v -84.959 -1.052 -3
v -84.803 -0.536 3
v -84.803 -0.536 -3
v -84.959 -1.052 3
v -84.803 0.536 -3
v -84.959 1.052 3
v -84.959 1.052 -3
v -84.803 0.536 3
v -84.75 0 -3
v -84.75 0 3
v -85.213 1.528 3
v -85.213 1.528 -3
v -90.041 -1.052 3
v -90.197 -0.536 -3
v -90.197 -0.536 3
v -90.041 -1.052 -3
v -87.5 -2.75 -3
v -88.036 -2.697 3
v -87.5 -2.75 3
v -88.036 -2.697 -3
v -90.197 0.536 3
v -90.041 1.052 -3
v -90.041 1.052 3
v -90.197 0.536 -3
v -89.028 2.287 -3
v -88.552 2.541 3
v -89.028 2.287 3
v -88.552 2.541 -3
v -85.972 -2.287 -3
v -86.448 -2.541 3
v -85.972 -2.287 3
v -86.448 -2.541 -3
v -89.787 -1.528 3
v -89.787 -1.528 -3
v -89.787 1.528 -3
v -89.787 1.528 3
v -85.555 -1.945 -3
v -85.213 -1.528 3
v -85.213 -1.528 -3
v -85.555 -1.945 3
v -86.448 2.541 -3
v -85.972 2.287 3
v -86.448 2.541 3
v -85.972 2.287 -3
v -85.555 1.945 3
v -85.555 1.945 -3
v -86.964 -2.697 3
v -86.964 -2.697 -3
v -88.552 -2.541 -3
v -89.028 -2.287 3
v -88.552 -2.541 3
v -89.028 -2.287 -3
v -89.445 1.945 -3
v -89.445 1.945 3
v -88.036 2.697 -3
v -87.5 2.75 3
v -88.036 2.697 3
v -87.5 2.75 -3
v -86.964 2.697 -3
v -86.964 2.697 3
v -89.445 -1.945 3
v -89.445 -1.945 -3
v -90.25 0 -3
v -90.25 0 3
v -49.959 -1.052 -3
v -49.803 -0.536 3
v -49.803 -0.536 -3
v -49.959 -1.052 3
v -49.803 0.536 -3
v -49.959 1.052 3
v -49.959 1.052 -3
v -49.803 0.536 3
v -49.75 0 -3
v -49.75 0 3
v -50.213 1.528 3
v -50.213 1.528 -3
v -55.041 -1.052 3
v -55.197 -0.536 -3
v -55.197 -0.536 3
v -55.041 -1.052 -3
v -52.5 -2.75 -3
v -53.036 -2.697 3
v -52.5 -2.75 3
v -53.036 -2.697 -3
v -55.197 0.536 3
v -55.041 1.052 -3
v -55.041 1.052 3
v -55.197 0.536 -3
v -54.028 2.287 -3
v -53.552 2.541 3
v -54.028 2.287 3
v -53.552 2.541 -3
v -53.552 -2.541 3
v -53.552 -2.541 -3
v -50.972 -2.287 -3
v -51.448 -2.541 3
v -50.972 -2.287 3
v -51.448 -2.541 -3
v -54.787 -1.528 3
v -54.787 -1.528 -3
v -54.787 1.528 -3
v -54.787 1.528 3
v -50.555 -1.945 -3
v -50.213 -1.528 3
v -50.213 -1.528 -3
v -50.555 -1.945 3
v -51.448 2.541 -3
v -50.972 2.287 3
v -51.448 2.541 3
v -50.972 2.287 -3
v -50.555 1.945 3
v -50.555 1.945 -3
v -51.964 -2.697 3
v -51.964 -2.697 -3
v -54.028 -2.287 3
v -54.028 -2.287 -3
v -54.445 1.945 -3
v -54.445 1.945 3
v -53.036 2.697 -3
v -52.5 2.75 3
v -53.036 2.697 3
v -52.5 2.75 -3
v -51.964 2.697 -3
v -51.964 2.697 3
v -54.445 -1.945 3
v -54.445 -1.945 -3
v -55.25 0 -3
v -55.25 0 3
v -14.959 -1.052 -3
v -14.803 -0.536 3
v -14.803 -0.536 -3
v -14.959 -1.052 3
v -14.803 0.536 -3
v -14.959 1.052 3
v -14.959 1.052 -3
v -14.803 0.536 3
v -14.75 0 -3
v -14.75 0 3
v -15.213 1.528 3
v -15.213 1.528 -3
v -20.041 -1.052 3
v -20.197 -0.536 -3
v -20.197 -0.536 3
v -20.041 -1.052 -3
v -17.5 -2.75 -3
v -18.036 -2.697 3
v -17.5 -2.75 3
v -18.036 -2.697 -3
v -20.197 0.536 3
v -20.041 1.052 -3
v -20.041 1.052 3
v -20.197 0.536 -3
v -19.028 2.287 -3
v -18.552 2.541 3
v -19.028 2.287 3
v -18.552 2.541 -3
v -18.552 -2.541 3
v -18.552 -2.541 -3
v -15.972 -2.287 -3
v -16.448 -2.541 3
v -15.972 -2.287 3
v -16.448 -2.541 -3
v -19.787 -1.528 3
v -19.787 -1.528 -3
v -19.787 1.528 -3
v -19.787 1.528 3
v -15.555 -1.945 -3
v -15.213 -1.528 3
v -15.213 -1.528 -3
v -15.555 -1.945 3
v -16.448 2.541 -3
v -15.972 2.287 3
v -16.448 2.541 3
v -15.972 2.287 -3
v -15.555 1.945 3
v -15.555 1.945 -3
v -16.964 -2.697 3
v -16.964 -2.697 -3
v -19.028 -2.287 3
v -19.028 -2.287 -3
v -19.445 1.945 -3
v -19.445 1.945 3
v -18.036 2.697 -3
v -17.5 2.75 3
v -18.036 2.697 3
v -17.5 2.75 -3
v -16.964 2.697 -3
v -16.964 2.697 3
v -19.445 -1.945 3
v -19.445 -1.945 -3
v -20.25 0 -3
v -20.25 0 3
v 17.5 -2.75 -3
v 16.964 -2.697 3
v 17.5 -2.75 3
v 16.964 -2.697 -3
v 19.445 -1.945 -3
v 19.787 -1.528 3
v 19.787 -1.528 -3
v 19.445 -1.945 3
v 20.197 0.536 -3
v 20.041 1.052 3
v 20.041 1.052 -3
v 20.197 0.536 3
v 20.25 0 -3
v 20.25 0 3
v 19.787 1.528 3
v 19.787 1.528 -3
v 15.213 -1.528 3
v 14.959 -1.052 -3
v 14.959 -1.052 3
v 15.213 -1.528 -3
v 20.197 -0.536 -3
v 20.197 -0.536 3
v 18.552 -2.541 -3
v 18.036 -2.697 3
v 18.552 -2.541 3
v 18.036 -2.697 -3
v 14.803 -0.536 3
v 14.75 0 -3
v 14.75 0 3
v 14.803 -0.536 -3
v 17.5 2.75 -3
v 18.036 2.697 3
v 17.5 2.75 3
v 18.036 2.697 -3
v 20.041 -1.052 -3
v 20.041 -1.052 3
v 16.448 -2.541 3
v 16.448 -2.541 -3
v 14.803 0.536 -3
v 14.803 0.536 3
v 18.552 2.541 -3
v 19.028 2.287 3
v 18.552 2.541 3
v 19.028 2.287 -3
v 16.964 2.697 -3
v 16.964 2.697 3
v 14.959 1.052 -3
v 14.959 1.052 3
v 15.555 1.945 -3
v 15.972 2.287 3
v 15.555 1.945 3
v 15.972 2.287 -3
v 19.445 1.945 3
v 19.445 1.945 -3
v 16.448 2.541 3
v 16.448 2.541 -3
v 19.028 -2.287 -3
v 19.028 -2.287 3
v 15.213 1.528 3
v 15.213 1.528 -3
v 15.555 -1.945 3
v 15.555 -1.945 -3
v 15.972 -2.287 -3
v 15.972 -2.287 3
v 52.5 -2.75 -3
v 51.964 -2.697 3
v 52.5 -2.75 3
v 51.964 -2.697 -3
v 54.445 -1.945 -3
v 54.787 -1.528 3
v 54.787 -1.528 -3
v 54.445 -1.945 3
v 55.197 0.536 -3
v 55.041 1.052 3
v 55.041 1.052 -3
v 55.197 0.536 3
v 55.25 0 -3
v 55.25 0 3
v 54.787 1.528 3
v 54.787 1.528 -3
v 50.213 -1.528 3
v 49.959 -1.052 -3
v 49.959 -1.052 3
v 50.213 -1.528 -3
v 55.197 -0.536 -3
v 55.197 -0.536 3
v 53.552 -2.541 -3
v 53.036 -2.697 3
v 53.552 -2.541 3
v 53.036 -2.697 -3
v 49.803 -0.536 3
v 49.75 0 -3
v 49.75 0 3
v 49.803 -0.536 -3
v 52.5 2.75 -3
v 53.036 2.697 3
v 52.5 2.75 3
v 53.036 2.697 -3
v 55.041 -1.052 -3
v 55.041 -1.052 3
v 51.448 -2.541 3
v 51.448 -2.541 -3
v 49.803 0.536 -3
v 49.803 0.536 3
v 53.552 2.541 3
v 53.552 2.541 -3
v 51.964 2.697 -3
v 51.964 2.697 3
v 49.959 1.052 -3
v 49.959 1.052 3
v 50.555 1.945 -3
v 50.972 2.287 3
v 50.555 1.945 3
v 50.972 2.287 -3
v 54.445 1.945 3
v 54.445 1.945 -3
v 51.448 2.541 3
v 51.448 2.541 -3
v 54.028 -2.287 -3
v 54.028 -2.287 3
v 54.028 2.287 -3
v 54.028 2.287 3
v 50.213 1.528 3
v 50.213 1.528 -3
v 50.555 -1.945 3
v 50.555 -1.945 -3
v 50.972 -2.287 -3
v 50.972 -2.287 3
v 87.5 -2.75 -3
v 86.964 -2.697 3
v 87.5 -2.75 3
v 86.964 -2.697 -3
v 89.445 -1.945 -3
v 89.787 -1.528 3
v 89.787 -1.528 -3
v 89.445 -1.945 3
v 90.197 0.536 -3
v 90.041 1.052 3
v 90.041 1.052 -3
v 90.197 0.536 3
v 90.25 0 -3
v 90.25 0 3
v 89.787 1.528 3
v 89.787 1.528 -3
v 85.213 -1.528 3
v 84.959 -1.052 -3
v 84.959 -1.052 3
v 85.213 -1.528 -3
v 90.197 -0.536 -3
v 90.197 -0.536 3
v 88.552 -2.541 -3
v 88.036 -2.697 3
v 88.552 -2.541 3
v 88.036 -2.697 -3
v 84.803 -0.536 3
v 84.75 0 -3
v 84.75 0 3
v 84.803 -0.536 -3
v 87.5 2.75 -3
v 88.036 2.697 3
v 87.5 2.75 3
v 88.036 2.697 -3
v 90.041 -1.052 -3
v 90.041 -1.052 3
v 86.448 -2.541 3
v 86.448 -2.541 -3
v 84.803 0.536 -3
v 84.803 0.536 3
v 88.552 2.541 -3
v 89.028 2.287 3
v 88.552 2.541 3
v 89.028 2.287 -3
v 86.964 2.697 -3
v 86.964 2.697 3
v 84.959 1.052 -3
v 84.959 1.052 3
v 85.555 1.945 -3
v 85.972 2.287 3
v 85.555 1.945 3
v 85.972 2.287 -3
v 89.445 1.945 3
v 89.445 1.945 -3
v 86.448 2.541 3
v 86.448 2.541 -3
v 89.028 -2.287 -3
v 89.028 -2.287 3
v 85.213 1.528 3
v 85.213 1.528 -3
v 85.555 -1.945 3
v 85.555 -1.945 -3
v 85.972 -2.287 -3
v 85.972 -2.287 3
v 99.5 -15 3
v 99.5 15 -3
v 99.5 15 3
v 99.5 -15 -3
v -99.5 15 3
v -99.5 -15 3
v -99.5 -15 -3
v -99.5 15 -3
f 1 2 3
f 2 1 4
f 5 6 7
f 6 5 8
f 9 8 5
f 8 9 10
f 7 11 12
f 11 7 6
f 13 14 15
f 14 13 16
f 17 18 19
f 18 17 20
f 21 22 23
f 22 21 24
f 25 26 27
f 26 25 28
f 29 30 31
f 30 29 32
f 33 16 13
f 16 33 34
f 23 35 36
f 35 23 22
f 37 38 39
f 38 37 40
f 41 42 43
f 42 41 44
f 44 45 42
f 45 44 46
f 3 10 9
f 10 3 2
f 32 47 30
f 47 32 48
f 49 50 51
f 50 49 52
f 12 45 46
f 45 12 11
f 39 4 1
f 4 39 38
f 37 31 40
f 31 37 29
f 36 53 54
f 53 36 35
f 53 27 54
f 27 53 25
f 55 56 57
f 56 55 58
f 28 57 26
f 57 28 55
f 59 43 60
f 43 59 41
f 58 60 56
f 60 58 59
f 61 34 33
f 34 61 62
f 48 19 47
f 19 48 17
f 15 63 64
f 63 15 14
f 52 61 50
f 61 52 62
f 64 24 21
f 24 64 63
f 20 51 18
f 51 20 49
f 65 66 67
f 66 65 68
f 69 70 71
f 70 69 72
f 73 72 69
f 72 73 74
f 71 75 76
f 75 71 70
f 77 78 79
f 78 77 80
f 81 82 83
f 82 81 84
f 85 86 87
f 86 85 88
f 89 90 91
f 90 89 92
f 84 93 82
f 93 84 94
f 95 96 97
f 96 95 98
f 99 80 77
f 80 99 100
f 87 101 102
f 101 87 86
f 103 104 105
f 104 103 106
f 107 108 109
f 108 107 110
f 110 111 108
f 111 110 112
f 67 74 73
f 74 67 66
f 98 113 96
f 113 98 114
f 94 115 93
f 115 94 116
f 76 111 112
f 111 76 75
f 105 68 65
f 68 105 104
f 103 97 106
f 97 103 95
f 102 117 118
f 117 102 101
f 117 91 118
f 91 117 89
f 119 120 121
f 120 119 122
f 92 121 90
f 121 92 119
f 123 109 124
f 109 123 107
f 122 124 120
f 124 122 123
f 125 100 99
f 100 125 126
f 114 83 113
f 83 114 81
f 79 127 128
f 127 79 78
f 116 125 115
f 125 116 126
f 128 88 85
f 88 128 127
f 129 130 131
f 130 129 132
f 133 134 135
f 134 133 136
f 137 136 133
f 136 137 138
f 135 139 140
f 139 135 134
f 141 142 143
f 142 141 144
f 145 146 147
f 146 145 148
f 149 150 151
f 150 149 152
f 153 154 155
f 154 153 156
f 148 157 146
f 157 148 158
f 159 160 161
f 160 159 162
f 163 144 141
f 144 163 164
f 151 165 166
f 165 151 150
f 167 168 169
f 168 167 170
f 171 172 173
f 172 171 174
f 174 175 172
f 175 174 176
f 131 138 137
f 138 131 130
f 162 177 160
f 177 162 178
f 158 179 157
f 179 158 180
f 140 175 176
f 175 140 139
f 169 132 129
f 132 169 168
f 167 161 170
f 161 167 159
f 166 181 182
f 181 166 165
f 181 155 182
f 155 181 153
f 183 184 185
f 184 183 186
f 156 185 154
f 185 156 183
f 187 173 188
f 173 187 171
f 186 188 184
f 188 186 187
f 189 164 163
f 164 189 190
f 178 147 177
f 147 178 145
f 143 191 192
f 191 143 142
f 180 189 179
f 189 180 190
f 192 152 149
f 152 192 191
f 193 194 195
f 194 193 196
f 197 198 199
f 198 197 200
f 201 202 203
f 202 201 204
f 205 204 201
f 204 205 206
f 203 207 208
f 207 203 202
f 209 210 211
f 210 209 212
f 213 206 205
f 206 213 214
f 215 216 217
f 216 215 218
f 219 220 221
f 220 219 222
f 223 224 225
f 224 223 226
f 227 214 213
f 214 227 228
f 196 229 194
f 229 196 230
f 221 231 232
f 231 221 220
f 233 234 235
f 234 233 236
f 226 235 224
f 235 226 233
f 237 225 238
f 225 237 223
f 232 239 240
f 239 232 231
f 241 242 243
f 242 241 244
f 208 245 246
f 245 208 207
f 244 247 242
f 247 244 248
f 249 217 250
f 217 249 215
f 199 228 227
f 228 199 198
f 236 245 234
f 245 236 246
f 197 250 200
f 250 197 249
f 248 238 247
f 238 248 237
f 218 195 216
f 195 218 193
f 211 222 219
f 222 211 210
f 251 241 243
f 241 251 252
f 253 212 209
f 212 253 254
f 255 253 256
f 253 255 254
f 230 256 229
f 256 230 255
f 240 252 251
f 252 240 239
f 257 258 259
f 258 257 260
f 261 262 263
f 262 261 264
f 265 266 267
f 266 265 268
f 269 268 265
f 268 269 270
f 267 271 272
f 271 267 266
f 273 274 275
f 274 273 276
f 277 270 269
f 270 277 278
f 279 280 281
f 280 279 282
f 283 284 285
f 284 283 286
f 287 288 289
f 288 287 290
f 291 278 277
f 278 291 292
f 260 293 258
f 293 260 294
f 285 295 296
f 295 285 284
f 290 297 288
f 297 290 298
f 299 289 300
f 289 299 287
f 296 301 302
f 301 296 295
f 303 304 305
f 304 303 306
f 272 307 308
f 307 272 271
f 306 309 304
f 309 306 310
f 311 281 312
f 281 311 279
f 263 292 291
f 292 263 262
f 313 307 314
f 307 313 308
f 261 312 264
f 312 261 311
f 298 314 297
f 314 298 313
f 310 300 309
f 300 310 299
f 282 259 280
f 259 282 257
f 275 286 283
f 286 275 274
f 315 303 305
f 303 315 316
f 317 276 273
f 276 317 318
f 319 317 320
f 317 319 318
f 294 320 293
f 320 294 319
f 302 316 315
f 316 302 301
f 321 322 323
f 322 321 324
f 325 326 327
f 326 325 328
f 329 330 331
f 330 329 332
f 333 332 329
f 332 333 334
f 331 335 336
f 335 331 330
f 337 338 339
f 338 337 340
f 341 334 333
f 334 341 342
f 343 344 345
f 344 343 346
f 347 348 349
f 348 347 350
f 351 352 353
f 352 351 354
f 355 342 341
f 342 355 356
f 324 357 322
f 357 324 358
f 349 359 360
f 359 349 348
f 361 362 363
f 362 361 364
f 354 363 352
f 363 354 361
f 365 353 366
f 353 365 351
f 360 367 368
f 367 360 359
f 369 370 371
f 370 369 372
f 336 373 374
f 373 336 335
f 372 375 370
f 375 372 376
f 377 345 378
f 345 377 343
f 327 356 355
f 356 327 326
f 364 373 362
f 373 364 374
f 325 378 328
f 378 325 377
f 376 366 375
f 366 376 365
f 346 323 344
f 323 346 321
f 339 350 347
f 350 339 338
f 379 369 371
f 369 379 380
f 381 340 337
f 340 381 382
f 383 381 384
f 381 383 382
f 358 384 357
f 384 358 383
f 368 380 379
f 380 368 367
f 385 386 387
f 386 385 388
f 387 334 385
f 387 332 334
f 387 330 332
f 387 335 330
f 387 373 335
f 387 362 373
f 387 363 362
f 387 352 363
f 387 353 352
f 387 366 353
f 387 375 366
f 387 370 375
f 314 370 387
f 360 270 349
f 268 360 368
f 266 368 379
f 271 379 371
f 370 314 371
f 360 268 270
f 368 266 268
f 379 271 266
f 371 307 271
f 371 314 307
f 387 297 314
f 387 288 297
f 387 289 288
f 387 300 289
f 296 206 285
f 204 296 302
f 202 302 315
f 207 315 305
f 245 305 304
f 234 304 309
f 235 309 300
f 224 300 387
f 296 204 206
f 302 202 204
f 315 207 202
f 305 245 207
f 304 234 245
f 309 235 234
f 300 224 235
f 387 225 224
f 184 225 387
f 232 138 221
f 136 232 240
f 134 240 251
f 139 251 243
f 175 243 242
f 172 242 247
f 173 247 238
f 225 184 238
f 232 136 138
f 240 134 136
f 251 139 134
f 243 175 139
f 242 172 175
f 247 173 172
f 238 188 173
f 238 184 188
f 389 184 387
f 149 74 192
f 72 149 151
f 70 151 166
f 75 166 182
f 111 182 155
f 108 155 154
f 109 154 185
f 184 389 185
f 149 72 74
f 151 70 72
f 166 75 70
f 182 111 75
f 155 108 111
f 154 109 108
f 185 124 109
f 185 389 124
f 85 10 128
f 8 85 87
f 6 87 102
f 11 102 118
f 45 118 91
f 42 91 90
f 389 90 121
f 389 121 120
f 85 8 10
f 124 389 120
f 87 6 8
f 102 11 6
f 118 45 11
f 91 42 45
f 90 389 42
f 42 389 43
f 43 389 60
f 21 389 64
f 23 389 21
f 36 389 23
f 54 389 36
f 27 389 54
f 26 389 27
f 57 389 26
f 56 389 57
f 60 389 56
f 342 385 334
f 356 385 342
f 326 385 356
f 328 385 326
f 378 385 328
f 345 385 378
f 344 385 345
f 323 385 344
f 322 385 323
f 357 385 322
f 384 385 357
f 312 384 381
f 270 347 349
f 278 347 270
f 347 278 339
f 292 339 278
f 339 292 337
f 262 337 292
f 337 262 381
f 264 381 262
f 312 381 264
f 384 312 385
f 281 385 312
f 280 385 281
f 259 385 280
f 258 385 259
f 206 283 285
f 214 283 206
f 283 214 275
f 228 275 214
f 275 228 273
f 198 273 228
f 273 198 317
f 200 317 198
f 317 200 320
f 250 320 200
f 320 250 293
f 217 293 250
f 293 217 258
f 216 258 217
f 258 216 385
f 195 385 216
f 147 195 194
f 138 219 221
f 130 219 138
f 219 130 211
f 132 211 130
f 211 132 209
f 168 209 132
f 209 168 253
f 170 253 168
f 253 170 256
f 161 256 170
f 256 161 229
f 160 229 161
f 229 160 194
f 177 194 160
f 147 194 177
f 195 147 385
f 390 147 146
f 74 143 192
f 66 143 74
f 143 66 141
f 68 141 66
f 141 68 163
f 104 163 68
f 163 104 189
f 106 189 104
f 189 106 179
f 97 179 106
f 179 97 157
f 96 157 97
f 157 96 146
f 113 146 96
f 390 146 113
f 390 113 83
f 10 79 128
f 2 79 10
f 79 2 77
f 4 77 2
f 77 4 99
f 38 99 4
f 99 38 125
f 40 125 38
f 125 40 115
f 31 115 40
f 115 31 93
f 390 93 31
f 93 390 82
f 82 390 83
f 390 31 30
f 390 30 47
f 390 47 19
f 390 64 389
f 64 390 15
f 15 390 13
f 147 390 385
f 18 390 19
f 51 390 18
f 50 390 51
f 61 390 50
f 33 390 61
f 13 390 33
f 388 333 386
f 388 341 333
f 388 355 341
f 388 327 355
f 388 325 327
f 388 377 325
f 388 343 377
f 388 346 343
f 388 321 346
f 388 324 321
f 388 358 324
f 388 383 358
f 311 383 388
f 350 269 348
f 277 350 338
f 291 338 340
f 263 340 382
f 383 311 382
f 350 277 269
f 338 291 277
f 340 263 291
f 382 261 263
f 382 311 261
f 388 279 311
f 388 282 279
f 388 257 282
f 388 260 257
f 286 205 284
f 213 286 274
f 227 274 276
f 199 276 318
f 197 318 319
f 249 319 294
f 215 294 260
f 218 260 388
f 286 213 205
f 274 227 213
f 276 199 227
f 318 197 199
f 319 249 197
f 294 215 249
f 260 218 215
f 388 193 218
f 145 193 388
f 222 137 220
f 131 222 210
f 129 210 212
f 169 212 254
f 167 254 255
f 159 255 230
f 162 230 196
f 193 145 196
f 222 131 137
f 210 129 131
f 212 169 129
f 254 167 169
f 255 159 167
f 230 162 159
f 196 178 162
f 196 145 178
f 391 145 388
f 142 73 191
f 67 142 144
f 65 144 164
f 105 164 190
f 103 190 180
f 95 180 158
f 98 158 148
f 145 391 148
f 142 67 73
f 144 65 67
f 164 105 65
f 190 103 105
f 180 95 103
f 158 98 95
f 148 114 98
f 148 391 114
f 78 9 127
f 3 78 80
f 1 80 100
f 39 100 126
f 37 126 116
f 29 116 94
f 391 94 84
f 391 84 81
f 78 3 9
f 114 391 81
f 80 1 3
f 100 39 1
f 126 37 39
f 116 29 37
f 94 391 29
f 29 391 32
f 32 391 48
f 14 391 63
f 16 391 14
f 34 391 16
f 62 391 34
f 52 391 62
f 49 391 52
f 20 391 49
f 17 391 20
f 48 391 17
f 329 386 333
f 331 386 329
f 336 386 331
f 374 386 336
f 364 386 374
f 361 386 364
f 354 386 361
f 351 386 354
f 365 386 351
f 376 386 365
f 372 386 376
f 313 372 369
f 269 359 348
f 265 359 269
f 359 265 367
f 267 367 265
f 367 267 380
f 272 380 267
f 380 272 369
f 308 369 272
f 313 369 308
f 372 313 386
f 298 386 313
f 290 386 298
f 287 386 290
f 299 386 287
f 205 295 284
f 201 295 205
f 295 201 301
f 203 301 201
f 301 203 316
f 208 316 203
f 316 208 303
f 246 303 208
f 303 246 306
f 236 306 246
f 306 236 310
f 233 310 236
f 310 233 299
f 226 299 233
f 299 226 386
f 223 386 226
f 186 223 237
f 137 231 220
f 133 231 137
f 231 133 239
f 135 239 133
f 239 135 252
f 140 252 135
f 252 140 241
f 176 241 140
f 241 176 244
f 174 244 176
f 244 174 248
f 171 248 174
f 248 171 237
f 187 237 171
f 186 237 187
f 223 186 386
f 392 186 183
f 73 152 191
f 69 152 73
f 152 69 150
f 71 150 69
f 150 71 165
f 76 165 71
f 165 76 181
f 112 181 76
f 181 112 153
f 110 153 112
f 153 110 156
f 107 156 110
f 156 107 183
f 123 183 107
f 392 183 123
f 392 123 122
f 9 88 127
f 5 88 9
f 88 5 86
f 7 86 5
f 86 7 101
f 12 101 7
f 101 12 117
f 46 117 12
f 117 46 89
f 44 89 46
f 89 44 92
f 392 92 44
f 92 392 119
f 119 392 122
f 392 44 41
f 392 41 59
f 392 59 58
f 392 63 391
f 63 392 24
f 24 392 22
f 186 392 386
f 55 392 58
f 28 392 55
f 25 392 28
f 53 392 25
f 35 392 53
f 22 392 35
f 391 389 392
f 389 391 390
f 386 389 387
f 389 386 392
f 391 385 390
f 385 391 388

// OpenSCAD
$fn = 32;

// ----------------------------------------------------------------------
// Hole bar, 6 x Ø5.5
// skip layout, 12 mm edge offset
// ----------------------------------------------------------------------

// --- parameters (mm) ---
bar_w = 30;         // bar width (Y)
bar_t = 6;          // bar thickness (Z)
holes = 6;          // holes per row
hole_d = 5.5;       // hole diameter
edge = 12;          // offset from the bar end to the first hole
grid_pitch = 17.5;  // grid the bar was laid out on

// --- derived feature positions (mm) ---
pitch = grid_pitch * 2;       // = 35   holes sit every other grid slot
span = (holes - 1) * pitch;   // = 175   distance between the end holes
bar_l = span + 2 * edge;      // = 199   overall bar length
start_x = -bar_l / 2 + edge;  // = -87.5   X of the first hole
feature_centers = [
  [start_x + 0 * pitch, 0],
  [start_x + 1 * pitch, 0],
  [start_x + 2 * pitch, 0],
  [start_x + 3 * pitch, 0],
  [start_x + 4 * pitch, 0],
  [start_x + 5 * pitch, 0]
];   // hole centres of the first row

// bar with one row of holes, drilled from feature_centers
difference() {
  translate([-bar_l / 2, -bar_w / 2, -bar_t / 2]) cube([bar_l, bar_w, bar_t]);
  for (centre = feature_centers)
    translate([centre[0], centre[1], 0])
      cylinder(d = hole_d, h = bar_t + 2, center = true);
}
